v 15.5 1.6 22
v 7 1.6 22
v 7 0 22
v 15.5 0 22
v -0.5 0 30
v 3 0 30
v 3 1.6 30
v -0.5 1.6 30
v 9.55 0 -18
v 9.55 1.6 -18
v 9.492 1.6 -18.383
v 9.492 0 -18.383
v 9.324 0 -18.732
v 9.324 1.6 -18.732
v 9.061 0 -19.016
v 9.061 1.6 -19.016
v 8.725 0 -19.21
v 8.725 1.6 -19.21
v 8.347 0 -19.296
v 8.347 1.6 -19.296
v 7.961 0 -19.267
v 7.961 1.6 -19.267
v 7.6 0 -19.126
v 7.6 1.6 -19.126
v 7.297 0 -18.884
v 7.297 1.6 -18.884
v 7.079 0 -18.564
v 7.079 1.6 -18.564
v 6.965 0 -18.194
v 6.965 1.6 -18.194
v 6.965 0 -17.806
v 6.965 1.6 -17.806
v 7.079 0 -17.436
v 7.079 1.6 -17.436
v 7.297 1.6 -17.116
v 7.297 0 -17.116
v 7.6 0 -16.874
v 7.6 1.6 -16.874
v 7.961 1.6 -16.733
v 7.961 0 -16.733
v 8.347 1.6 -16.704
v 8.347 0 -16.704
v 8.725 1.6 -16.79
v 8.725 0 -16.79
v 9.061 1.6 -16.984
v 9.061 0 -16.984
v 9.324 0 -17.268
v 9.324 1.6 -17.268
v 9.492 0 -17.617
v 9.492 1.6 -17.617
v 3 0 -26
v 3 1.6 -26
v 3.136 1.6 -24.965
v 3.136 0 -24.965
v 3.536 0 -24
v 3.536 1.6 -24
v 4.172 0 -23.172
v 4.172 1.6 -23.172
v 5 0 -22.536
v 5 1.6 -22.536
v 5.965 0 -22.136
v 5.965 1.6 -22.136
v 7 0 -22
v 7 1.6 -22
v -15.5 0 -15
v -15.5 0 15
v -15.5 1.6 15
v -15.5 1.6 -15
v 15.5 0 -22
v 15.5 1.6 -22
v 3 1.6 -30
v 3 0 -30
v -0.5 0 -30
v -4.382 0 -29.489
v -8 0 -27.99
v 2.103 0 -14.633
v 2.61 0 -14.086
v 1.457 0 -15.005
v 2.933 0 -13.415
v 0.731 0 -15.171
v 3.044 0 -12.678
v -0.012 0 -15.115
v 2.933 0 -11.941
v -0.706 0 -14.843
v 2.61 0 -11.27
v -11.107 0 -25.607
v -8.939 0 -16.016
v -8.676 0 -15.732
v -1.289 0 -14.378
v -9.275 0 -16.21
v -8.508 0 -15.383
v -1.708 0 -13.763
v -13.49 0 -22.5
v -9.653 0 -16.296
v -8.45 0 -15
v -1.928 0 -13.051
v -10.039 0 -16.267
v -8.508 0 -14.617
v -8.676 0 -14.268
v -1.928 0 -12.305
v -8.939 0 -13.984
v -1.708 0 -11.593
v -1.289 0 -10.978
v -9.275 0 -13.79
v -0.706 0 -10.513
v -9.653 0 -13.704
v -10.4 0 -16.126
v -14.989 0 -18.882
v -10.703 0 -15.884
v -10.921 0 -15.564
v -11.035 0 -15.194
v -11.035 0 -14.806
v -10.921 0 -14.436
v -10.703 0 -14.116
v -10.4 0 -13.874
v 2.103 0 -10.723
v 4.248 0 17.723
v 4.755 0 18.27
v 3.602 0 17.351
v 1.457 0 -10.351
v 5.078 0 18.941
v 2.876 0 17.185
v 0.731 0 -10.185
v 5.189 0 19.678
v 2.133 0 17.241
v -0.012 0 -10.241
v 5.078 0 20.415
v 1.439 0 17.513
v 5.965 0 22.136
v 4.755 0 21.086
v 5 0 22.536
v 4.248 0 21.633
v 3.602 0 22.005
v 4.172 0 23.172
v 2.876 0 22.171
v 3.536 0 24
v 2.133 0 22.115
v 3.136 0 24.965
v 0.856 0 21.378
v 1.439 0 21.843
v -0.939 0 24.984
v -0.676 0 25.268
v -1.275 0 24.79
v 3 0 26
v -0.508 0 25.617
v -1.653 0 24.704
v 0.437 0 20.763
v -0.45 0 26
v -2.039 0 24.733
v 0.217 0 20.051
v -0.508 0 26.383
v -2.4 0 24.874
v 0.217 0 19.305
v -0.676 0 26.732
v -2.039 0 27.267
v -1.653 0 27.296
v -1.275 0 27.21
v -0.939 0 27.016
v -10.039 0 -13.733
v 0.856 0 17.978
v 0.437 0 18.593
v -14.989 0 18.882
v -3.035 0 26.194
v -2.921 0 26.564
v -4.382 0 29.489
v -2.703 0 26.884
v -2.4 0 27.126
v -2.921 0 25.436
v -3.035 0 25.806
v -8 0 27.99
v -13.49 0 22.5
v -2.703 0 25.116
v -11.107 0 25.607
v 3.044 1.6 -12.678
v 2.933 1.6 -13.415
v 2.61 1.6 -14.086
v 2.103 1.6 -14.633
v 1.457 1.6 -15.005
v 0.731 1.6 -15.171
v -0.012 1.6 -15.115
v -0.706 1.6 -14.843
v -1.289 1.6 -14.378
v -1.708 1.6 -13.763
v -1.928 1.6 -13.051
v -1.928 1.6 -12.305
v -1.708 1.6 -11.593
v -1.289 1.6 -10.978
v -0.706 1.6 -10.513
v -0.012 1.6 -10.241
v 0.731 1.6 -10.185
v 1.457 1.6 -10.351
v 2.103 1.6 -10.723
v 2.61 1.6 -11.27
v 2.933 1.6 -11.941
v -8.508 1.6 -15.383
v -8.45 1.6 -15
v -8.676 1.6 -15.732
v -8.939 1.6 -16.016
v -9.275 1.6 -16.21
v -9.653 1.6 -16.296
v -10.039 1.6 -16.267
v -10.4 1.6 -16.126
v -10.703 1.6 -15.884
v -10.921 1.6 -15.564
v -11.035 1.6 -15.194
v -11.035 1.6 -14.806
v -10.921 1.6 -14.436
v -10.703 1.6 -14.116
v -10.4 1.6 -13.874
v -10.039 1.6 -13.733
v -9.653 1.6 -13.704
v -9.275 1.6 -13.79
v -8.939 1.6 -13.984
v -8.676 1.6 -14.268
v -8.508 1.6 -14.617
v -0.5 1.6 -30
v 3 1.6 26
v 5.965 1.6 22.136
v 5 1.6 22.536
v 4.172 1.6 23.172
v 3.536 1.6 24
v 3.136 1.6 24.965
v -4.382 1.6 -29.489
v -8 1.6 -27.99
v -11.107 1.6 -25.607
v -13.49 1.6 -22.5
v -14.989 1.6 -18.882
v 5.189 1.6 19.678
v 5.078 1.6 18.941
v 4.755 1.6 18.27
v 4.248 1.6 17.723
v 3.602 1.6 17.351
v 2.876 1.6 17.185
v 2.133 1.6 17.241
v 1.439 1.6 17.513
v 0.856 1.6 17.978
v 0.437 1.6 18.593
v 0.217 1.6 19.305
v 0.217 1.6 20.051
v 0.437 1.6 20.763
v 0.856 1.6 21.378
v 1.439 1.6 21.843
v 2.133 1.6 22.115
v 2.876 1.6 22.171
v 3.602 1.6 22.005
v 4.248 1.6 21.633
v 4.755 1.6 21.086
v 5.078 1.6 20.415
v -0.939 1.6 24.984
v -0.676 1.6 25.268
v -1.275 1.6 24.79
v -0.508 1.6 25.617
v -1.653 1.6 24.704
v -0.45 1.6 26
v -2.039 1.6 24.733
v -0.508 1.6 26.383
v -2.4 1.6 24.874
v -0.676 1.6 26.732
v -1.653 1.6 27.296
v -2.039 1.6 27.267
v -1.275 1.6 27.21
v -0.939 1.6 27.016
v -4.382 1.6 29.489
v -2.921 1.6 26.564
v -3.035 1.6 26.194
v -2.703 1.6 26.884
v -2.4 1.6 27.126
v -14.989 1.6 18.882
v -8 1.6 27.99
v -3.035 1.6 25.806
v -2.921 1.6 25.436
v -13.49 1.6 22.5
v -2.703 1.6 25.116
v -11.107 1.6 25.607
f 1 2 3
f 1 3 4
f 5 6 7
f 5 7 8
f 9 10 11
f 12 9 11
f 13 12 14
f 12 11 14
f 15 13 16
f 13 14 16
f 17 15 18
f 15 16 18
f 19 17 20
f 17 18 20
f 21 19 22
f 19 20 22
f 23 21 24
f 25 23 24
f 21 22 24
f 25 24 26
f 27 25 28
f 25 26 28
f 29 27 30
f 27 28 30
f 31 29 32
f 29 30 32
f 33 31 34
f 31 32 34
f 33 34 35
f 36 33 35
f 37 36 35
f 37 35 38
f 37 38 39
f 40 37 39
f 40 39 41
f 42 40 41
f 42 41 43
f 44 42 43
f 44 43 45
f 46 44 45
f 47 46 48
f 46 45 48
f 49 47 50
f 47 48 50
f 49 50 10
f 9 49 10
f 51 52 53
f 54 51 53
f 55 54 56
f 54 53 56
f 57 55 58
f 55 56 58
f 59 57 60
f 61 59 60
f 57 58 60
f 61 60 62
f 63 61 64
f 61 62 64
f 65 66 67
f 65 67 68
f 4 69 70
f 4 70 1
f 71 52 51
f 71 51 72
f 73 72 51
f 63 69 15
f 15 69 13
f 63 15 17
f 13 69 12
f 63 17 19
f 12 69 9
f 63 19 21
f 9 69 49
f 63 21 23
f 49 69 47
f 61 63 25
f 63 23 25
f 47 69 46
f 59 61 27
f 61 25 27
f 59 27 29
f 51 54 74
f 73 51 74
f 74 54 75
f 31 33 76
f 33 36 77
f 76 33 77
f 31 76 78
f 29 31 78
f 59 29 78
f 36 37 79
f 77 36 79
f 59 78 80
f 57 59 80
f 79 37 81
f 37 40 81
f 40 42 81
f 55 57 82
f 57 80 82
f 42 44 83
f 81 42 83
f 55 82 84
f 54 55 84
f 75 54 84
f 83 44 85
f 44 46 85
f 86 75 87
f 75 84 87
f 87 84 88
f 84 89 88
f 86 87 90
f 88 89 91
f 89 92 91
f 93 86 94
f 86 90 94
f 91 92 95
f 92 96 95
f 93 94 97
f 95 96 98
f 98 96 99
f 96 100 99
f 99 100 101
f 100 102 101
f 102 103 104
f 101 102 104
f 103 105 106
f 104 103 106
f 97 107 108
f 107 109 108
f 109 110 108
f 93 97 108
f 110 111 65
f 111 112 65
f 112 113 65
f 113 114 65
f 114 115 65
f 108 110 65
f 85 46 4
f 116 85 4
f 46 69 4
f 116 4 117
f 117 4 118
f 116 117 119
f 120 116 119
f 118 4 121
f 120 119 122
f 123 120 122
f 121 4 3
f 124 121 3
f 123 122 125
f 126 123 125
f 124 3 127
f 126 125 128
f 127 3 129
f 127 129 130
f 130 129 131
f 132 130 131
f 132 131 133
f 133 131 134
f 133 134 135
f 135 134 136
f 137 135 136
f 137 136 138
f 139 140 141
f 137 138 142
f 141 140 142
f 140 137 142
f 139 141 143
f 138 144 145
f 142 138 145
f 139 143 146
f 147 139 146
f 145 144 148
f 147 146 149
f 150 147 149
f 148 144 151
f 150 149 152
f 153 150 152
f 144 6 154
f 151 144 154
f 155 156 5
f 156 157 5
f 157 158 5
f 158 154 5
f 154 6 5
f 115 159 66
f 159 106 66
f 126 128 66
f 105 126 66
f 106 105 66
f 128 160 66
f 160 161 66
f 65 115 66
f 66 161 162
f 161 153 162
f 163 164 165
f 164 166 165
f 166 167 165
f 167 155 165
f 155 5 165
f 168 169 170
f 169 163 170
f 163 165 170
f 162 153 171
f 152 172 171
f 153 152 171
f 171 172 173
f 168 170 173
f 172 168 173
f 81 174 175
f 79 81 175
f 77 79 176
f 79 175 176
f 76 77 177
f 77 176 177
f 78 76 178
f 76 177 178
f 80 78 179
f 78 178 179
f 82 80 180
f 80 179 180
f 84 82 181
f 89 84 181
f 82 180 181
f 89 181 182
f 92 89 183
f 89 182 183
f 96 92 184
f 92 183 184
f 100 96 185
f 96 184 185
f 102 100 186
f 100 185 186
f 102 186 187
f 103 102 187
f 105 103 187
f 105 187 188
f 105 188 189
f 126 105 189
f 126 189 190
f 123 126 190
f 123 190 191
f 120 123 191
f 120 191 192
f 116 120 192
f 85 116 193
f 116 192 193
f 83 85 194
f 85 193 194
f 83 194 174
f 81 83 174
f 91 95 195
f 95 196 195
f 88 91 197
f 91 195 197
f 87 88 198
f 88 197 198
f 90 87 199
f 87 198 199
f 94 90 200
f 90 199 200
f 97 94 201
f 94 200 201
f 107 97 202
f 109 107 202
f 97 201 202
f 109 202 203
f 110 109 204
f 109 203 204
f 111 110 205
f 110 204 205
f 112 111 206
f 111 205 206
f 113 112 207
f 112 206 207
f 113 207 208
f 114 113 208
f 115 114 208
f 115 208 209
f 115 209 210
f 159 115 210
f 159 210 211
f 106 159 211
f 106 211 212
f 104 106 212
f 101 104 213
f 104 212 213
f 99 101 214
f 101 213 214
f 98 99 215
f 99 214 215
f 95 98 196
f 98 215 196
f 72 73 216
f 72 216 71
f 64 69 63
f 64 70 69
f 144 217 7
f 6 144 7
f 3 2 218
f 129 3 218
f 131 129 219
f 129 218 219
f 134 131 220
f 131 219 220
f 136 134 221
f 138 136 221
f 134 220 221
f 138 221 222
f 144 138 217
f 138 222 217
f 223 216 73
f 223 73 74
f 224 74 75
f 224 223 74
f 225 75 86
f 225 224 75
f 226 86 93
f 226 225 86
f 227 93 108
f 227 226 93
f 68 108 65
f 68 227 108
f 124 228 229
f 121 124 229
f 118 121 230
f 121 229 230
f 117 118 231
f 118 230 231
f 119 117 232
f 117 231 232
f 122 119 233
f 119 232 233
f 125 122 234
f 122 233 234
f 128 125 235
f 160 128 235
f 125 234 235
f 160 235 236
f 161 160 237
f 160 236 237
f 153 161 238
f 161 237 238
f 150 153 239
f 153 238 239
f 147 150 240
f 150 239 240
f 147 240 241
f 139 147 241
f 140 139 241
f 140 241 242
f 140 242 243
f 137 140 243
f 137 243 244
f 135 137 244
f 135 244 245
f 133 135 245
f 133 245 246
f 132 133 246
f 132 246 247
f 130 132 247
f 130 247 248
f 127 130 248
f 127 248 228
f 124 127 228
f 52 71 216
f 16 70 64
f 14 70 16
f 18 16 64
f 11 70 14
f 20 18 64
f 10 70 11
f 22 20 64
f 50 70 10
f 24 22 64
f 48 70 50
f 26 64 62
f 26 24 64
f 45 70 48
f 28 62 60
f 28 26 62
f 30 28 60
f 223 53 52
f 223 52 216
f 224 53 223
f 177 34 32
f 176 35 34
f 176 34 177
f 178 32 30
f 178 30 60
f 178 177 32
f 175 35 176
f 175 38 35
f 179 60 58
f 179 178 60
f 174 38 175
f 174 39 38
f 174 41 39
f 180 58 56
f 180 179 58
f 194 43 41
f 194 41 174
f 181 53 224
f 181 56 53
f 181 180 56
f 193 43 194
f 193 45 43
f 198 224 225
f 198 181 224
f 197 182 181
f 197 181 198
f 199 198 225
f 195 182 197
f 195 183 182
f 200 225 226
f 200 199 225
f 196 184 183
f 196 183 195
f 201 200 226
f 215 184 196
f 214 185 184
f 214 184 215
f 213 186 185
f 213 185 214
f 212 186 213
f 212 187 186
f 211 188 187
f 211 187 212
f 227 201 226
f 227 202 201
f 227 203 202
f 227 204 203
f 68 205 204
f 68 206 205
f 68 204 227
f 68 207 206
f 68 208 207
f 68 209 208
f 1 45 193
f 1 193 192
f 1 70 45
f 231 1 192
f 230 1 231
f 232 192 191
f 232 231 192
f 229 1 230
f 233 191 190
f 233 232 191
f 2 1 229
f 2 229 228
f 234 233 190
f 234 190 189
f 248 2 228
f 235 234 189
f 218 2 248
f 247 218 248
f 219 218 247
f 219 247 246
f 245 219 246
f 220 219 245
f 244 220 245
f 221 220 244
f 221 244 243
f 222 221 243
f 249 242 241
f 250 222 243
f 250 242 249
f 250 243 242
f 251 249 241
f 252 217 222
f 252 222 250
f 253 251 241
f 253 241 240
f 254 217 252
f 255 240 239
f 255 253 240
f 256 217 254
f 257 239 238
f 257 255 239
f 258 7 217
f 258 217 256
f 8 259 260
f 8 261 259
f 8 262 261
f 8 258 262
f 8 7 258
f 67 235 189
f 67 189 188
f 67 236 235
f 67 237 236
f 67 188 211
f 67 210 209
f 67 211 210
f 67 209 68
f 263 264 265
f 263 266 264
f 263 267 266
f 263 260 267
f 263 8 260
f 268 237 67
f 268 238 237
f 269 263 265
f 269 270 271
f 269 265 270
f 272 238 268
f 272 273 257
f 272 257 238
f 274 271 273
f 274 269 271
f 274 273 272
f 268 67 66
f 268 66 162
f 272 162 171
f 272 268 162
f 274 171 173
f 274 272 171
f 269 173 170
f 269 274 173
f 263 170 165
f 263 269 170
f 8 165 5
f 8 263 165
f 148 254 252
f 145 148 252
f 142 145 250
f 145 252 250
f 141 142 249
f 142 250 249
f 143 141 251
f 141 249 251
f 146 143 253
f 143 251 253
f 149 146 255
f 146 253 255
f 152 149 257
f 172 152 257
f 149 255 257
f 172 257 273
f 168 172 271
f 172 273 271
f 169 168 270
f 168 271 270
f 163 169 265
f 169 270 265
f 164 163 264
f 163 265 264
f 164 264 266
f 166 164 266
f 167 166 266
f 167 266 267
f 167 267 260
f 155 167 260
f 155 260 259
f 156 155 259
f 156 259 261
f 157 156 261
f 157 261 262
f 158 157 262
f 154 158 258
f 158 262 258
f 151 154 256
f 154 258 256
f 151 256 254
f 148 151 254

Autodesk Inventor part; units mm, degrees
ref_plane "YZ Plane" through (0, 0, 0) normal (1, 0, 0) x (0, 1, 0)
ref_plane "XZ Plane" through (0, 0, 0) normal (0, 1, 0) x (-1, 0, 0)
ref_plane "XY Plane" through (0, 0, 0) normal (0, 0, 1) x (1, 0, 0)
sketch "Esquisse1" plane through (0, 0, 0) normal (0, 1, 0) x (-1, 0, 0)
  line L0 (15.5, -30) -> (-15.5, -30)
  line L1 (-15.5, -30) -> (-15.5, 30)
  line L2 (-15.5, 30) -> (15.5, 30)
  line L3 (15.5, 30) -> (15.5, -30)
  point P0 (0, 0)
  dimension "d0" = 31
  dimension "d1" = 60
  dimension "d2" = 30
  dimension "d3" = 15.5
extrude "Extrusion1" add sketch "Esquisse1" along normal blind 1.6
fillet "Congé1" radius 15 2 edges at (-15.5, 0.8, -30) (-15.5, 0.8, 30)
sketch "Esquisse2" plane through (0, 1.6, 0) normal (0, 1, 0) x (1, 0, 0)
  circle A0 centre (7, 26) radius 4
  circle A1 centre (7, -26) radius 4
  line L0 (-0.5, -30) -> (15.5, -30) projected
  line L1 (3, 26) -> (3, 30)
  line L2 (15.5, 30) -> (-0.5, 30) projected
  line L3 (7, 30) -> (3, 30)
  line L4 (7, 30) -> (15.5, 30)
  line L5 (15.5, 30) -> (15.5, 22)
  line L6 (15.5, -30) -> (15.5, 30) projected
  line L7 (15.5, 22) -> (7, 22)
  line L8 (7, -22) -> (15.5, -22)
  line L9 (15.5, -22) -> (15.5, -30)
  line L10 (15.5, -30) -> (7, -30)
  line L11 (3, -26) -> (3, -30)
  line L12 (3, -30) -> (7, -30)
  point P0 (0, 0)
  dimension "d7" = 8
  dimension "d8" = 7
  dimension "d9" = 7
  dimension "d10" = 26
  dimension "d11" = 26
extrude "Extrusion3" cut sketch "Esquisse2" against normal through all
sketch "Esquisse3" plane through (0, 1.6, 0) normal (0, 1, 0) x (1, 0, 0)
  circle A0 centre (-9.75, 15) radius 1.3
  circle A1 centre (-1.75, -26) radius 1.3
  circle A2 centre (8.25, 18) radius 1.3
  line L0 (-15.5, 15) -> (-15.5, -15) projected
  circle A3 centre (2.689, -19.678) radius 2.5
  circle A4 centre (0.544, 12.678) radius 2.5
  point P0 (0, 0)
  dimension "d19" = 2.6
  dimension "d20" = 2.6
  dimension "d21" = 2.6
  dimension "d23" = 13.75
  dimension "d24" = 15
  dimension "d25" = 5.75
  dimension "d26" = 18
  dimension "d27" = 8.25
  dimension "d30" = 15.5
  dimension "d31" = 11
  dimension "d32" = 5
  dimension "d33" = 5
  dimension "d34" = 34.678
  dimension "d35" = 2.322
  dimension "d36" = 18.189
  dimension "d37" = 16.044
extrude "Extrusion4" cut sketch "Esquisse3" against normal blind 18.189
equation "\"d2\" = 0.5 * d1"
equation "\"d3\" = 0.5 * d0"
equation "\"d9\" = d8"
equation "\"d11\" = d10"
equation "\"d20\" = d19"
equation "\"d21\" = d19"
equation "\"d33\" = d32"
equation "\"d28\" = d36"
properties part number "PCB Droit" material "Nylon, disulfure de molybdène"
